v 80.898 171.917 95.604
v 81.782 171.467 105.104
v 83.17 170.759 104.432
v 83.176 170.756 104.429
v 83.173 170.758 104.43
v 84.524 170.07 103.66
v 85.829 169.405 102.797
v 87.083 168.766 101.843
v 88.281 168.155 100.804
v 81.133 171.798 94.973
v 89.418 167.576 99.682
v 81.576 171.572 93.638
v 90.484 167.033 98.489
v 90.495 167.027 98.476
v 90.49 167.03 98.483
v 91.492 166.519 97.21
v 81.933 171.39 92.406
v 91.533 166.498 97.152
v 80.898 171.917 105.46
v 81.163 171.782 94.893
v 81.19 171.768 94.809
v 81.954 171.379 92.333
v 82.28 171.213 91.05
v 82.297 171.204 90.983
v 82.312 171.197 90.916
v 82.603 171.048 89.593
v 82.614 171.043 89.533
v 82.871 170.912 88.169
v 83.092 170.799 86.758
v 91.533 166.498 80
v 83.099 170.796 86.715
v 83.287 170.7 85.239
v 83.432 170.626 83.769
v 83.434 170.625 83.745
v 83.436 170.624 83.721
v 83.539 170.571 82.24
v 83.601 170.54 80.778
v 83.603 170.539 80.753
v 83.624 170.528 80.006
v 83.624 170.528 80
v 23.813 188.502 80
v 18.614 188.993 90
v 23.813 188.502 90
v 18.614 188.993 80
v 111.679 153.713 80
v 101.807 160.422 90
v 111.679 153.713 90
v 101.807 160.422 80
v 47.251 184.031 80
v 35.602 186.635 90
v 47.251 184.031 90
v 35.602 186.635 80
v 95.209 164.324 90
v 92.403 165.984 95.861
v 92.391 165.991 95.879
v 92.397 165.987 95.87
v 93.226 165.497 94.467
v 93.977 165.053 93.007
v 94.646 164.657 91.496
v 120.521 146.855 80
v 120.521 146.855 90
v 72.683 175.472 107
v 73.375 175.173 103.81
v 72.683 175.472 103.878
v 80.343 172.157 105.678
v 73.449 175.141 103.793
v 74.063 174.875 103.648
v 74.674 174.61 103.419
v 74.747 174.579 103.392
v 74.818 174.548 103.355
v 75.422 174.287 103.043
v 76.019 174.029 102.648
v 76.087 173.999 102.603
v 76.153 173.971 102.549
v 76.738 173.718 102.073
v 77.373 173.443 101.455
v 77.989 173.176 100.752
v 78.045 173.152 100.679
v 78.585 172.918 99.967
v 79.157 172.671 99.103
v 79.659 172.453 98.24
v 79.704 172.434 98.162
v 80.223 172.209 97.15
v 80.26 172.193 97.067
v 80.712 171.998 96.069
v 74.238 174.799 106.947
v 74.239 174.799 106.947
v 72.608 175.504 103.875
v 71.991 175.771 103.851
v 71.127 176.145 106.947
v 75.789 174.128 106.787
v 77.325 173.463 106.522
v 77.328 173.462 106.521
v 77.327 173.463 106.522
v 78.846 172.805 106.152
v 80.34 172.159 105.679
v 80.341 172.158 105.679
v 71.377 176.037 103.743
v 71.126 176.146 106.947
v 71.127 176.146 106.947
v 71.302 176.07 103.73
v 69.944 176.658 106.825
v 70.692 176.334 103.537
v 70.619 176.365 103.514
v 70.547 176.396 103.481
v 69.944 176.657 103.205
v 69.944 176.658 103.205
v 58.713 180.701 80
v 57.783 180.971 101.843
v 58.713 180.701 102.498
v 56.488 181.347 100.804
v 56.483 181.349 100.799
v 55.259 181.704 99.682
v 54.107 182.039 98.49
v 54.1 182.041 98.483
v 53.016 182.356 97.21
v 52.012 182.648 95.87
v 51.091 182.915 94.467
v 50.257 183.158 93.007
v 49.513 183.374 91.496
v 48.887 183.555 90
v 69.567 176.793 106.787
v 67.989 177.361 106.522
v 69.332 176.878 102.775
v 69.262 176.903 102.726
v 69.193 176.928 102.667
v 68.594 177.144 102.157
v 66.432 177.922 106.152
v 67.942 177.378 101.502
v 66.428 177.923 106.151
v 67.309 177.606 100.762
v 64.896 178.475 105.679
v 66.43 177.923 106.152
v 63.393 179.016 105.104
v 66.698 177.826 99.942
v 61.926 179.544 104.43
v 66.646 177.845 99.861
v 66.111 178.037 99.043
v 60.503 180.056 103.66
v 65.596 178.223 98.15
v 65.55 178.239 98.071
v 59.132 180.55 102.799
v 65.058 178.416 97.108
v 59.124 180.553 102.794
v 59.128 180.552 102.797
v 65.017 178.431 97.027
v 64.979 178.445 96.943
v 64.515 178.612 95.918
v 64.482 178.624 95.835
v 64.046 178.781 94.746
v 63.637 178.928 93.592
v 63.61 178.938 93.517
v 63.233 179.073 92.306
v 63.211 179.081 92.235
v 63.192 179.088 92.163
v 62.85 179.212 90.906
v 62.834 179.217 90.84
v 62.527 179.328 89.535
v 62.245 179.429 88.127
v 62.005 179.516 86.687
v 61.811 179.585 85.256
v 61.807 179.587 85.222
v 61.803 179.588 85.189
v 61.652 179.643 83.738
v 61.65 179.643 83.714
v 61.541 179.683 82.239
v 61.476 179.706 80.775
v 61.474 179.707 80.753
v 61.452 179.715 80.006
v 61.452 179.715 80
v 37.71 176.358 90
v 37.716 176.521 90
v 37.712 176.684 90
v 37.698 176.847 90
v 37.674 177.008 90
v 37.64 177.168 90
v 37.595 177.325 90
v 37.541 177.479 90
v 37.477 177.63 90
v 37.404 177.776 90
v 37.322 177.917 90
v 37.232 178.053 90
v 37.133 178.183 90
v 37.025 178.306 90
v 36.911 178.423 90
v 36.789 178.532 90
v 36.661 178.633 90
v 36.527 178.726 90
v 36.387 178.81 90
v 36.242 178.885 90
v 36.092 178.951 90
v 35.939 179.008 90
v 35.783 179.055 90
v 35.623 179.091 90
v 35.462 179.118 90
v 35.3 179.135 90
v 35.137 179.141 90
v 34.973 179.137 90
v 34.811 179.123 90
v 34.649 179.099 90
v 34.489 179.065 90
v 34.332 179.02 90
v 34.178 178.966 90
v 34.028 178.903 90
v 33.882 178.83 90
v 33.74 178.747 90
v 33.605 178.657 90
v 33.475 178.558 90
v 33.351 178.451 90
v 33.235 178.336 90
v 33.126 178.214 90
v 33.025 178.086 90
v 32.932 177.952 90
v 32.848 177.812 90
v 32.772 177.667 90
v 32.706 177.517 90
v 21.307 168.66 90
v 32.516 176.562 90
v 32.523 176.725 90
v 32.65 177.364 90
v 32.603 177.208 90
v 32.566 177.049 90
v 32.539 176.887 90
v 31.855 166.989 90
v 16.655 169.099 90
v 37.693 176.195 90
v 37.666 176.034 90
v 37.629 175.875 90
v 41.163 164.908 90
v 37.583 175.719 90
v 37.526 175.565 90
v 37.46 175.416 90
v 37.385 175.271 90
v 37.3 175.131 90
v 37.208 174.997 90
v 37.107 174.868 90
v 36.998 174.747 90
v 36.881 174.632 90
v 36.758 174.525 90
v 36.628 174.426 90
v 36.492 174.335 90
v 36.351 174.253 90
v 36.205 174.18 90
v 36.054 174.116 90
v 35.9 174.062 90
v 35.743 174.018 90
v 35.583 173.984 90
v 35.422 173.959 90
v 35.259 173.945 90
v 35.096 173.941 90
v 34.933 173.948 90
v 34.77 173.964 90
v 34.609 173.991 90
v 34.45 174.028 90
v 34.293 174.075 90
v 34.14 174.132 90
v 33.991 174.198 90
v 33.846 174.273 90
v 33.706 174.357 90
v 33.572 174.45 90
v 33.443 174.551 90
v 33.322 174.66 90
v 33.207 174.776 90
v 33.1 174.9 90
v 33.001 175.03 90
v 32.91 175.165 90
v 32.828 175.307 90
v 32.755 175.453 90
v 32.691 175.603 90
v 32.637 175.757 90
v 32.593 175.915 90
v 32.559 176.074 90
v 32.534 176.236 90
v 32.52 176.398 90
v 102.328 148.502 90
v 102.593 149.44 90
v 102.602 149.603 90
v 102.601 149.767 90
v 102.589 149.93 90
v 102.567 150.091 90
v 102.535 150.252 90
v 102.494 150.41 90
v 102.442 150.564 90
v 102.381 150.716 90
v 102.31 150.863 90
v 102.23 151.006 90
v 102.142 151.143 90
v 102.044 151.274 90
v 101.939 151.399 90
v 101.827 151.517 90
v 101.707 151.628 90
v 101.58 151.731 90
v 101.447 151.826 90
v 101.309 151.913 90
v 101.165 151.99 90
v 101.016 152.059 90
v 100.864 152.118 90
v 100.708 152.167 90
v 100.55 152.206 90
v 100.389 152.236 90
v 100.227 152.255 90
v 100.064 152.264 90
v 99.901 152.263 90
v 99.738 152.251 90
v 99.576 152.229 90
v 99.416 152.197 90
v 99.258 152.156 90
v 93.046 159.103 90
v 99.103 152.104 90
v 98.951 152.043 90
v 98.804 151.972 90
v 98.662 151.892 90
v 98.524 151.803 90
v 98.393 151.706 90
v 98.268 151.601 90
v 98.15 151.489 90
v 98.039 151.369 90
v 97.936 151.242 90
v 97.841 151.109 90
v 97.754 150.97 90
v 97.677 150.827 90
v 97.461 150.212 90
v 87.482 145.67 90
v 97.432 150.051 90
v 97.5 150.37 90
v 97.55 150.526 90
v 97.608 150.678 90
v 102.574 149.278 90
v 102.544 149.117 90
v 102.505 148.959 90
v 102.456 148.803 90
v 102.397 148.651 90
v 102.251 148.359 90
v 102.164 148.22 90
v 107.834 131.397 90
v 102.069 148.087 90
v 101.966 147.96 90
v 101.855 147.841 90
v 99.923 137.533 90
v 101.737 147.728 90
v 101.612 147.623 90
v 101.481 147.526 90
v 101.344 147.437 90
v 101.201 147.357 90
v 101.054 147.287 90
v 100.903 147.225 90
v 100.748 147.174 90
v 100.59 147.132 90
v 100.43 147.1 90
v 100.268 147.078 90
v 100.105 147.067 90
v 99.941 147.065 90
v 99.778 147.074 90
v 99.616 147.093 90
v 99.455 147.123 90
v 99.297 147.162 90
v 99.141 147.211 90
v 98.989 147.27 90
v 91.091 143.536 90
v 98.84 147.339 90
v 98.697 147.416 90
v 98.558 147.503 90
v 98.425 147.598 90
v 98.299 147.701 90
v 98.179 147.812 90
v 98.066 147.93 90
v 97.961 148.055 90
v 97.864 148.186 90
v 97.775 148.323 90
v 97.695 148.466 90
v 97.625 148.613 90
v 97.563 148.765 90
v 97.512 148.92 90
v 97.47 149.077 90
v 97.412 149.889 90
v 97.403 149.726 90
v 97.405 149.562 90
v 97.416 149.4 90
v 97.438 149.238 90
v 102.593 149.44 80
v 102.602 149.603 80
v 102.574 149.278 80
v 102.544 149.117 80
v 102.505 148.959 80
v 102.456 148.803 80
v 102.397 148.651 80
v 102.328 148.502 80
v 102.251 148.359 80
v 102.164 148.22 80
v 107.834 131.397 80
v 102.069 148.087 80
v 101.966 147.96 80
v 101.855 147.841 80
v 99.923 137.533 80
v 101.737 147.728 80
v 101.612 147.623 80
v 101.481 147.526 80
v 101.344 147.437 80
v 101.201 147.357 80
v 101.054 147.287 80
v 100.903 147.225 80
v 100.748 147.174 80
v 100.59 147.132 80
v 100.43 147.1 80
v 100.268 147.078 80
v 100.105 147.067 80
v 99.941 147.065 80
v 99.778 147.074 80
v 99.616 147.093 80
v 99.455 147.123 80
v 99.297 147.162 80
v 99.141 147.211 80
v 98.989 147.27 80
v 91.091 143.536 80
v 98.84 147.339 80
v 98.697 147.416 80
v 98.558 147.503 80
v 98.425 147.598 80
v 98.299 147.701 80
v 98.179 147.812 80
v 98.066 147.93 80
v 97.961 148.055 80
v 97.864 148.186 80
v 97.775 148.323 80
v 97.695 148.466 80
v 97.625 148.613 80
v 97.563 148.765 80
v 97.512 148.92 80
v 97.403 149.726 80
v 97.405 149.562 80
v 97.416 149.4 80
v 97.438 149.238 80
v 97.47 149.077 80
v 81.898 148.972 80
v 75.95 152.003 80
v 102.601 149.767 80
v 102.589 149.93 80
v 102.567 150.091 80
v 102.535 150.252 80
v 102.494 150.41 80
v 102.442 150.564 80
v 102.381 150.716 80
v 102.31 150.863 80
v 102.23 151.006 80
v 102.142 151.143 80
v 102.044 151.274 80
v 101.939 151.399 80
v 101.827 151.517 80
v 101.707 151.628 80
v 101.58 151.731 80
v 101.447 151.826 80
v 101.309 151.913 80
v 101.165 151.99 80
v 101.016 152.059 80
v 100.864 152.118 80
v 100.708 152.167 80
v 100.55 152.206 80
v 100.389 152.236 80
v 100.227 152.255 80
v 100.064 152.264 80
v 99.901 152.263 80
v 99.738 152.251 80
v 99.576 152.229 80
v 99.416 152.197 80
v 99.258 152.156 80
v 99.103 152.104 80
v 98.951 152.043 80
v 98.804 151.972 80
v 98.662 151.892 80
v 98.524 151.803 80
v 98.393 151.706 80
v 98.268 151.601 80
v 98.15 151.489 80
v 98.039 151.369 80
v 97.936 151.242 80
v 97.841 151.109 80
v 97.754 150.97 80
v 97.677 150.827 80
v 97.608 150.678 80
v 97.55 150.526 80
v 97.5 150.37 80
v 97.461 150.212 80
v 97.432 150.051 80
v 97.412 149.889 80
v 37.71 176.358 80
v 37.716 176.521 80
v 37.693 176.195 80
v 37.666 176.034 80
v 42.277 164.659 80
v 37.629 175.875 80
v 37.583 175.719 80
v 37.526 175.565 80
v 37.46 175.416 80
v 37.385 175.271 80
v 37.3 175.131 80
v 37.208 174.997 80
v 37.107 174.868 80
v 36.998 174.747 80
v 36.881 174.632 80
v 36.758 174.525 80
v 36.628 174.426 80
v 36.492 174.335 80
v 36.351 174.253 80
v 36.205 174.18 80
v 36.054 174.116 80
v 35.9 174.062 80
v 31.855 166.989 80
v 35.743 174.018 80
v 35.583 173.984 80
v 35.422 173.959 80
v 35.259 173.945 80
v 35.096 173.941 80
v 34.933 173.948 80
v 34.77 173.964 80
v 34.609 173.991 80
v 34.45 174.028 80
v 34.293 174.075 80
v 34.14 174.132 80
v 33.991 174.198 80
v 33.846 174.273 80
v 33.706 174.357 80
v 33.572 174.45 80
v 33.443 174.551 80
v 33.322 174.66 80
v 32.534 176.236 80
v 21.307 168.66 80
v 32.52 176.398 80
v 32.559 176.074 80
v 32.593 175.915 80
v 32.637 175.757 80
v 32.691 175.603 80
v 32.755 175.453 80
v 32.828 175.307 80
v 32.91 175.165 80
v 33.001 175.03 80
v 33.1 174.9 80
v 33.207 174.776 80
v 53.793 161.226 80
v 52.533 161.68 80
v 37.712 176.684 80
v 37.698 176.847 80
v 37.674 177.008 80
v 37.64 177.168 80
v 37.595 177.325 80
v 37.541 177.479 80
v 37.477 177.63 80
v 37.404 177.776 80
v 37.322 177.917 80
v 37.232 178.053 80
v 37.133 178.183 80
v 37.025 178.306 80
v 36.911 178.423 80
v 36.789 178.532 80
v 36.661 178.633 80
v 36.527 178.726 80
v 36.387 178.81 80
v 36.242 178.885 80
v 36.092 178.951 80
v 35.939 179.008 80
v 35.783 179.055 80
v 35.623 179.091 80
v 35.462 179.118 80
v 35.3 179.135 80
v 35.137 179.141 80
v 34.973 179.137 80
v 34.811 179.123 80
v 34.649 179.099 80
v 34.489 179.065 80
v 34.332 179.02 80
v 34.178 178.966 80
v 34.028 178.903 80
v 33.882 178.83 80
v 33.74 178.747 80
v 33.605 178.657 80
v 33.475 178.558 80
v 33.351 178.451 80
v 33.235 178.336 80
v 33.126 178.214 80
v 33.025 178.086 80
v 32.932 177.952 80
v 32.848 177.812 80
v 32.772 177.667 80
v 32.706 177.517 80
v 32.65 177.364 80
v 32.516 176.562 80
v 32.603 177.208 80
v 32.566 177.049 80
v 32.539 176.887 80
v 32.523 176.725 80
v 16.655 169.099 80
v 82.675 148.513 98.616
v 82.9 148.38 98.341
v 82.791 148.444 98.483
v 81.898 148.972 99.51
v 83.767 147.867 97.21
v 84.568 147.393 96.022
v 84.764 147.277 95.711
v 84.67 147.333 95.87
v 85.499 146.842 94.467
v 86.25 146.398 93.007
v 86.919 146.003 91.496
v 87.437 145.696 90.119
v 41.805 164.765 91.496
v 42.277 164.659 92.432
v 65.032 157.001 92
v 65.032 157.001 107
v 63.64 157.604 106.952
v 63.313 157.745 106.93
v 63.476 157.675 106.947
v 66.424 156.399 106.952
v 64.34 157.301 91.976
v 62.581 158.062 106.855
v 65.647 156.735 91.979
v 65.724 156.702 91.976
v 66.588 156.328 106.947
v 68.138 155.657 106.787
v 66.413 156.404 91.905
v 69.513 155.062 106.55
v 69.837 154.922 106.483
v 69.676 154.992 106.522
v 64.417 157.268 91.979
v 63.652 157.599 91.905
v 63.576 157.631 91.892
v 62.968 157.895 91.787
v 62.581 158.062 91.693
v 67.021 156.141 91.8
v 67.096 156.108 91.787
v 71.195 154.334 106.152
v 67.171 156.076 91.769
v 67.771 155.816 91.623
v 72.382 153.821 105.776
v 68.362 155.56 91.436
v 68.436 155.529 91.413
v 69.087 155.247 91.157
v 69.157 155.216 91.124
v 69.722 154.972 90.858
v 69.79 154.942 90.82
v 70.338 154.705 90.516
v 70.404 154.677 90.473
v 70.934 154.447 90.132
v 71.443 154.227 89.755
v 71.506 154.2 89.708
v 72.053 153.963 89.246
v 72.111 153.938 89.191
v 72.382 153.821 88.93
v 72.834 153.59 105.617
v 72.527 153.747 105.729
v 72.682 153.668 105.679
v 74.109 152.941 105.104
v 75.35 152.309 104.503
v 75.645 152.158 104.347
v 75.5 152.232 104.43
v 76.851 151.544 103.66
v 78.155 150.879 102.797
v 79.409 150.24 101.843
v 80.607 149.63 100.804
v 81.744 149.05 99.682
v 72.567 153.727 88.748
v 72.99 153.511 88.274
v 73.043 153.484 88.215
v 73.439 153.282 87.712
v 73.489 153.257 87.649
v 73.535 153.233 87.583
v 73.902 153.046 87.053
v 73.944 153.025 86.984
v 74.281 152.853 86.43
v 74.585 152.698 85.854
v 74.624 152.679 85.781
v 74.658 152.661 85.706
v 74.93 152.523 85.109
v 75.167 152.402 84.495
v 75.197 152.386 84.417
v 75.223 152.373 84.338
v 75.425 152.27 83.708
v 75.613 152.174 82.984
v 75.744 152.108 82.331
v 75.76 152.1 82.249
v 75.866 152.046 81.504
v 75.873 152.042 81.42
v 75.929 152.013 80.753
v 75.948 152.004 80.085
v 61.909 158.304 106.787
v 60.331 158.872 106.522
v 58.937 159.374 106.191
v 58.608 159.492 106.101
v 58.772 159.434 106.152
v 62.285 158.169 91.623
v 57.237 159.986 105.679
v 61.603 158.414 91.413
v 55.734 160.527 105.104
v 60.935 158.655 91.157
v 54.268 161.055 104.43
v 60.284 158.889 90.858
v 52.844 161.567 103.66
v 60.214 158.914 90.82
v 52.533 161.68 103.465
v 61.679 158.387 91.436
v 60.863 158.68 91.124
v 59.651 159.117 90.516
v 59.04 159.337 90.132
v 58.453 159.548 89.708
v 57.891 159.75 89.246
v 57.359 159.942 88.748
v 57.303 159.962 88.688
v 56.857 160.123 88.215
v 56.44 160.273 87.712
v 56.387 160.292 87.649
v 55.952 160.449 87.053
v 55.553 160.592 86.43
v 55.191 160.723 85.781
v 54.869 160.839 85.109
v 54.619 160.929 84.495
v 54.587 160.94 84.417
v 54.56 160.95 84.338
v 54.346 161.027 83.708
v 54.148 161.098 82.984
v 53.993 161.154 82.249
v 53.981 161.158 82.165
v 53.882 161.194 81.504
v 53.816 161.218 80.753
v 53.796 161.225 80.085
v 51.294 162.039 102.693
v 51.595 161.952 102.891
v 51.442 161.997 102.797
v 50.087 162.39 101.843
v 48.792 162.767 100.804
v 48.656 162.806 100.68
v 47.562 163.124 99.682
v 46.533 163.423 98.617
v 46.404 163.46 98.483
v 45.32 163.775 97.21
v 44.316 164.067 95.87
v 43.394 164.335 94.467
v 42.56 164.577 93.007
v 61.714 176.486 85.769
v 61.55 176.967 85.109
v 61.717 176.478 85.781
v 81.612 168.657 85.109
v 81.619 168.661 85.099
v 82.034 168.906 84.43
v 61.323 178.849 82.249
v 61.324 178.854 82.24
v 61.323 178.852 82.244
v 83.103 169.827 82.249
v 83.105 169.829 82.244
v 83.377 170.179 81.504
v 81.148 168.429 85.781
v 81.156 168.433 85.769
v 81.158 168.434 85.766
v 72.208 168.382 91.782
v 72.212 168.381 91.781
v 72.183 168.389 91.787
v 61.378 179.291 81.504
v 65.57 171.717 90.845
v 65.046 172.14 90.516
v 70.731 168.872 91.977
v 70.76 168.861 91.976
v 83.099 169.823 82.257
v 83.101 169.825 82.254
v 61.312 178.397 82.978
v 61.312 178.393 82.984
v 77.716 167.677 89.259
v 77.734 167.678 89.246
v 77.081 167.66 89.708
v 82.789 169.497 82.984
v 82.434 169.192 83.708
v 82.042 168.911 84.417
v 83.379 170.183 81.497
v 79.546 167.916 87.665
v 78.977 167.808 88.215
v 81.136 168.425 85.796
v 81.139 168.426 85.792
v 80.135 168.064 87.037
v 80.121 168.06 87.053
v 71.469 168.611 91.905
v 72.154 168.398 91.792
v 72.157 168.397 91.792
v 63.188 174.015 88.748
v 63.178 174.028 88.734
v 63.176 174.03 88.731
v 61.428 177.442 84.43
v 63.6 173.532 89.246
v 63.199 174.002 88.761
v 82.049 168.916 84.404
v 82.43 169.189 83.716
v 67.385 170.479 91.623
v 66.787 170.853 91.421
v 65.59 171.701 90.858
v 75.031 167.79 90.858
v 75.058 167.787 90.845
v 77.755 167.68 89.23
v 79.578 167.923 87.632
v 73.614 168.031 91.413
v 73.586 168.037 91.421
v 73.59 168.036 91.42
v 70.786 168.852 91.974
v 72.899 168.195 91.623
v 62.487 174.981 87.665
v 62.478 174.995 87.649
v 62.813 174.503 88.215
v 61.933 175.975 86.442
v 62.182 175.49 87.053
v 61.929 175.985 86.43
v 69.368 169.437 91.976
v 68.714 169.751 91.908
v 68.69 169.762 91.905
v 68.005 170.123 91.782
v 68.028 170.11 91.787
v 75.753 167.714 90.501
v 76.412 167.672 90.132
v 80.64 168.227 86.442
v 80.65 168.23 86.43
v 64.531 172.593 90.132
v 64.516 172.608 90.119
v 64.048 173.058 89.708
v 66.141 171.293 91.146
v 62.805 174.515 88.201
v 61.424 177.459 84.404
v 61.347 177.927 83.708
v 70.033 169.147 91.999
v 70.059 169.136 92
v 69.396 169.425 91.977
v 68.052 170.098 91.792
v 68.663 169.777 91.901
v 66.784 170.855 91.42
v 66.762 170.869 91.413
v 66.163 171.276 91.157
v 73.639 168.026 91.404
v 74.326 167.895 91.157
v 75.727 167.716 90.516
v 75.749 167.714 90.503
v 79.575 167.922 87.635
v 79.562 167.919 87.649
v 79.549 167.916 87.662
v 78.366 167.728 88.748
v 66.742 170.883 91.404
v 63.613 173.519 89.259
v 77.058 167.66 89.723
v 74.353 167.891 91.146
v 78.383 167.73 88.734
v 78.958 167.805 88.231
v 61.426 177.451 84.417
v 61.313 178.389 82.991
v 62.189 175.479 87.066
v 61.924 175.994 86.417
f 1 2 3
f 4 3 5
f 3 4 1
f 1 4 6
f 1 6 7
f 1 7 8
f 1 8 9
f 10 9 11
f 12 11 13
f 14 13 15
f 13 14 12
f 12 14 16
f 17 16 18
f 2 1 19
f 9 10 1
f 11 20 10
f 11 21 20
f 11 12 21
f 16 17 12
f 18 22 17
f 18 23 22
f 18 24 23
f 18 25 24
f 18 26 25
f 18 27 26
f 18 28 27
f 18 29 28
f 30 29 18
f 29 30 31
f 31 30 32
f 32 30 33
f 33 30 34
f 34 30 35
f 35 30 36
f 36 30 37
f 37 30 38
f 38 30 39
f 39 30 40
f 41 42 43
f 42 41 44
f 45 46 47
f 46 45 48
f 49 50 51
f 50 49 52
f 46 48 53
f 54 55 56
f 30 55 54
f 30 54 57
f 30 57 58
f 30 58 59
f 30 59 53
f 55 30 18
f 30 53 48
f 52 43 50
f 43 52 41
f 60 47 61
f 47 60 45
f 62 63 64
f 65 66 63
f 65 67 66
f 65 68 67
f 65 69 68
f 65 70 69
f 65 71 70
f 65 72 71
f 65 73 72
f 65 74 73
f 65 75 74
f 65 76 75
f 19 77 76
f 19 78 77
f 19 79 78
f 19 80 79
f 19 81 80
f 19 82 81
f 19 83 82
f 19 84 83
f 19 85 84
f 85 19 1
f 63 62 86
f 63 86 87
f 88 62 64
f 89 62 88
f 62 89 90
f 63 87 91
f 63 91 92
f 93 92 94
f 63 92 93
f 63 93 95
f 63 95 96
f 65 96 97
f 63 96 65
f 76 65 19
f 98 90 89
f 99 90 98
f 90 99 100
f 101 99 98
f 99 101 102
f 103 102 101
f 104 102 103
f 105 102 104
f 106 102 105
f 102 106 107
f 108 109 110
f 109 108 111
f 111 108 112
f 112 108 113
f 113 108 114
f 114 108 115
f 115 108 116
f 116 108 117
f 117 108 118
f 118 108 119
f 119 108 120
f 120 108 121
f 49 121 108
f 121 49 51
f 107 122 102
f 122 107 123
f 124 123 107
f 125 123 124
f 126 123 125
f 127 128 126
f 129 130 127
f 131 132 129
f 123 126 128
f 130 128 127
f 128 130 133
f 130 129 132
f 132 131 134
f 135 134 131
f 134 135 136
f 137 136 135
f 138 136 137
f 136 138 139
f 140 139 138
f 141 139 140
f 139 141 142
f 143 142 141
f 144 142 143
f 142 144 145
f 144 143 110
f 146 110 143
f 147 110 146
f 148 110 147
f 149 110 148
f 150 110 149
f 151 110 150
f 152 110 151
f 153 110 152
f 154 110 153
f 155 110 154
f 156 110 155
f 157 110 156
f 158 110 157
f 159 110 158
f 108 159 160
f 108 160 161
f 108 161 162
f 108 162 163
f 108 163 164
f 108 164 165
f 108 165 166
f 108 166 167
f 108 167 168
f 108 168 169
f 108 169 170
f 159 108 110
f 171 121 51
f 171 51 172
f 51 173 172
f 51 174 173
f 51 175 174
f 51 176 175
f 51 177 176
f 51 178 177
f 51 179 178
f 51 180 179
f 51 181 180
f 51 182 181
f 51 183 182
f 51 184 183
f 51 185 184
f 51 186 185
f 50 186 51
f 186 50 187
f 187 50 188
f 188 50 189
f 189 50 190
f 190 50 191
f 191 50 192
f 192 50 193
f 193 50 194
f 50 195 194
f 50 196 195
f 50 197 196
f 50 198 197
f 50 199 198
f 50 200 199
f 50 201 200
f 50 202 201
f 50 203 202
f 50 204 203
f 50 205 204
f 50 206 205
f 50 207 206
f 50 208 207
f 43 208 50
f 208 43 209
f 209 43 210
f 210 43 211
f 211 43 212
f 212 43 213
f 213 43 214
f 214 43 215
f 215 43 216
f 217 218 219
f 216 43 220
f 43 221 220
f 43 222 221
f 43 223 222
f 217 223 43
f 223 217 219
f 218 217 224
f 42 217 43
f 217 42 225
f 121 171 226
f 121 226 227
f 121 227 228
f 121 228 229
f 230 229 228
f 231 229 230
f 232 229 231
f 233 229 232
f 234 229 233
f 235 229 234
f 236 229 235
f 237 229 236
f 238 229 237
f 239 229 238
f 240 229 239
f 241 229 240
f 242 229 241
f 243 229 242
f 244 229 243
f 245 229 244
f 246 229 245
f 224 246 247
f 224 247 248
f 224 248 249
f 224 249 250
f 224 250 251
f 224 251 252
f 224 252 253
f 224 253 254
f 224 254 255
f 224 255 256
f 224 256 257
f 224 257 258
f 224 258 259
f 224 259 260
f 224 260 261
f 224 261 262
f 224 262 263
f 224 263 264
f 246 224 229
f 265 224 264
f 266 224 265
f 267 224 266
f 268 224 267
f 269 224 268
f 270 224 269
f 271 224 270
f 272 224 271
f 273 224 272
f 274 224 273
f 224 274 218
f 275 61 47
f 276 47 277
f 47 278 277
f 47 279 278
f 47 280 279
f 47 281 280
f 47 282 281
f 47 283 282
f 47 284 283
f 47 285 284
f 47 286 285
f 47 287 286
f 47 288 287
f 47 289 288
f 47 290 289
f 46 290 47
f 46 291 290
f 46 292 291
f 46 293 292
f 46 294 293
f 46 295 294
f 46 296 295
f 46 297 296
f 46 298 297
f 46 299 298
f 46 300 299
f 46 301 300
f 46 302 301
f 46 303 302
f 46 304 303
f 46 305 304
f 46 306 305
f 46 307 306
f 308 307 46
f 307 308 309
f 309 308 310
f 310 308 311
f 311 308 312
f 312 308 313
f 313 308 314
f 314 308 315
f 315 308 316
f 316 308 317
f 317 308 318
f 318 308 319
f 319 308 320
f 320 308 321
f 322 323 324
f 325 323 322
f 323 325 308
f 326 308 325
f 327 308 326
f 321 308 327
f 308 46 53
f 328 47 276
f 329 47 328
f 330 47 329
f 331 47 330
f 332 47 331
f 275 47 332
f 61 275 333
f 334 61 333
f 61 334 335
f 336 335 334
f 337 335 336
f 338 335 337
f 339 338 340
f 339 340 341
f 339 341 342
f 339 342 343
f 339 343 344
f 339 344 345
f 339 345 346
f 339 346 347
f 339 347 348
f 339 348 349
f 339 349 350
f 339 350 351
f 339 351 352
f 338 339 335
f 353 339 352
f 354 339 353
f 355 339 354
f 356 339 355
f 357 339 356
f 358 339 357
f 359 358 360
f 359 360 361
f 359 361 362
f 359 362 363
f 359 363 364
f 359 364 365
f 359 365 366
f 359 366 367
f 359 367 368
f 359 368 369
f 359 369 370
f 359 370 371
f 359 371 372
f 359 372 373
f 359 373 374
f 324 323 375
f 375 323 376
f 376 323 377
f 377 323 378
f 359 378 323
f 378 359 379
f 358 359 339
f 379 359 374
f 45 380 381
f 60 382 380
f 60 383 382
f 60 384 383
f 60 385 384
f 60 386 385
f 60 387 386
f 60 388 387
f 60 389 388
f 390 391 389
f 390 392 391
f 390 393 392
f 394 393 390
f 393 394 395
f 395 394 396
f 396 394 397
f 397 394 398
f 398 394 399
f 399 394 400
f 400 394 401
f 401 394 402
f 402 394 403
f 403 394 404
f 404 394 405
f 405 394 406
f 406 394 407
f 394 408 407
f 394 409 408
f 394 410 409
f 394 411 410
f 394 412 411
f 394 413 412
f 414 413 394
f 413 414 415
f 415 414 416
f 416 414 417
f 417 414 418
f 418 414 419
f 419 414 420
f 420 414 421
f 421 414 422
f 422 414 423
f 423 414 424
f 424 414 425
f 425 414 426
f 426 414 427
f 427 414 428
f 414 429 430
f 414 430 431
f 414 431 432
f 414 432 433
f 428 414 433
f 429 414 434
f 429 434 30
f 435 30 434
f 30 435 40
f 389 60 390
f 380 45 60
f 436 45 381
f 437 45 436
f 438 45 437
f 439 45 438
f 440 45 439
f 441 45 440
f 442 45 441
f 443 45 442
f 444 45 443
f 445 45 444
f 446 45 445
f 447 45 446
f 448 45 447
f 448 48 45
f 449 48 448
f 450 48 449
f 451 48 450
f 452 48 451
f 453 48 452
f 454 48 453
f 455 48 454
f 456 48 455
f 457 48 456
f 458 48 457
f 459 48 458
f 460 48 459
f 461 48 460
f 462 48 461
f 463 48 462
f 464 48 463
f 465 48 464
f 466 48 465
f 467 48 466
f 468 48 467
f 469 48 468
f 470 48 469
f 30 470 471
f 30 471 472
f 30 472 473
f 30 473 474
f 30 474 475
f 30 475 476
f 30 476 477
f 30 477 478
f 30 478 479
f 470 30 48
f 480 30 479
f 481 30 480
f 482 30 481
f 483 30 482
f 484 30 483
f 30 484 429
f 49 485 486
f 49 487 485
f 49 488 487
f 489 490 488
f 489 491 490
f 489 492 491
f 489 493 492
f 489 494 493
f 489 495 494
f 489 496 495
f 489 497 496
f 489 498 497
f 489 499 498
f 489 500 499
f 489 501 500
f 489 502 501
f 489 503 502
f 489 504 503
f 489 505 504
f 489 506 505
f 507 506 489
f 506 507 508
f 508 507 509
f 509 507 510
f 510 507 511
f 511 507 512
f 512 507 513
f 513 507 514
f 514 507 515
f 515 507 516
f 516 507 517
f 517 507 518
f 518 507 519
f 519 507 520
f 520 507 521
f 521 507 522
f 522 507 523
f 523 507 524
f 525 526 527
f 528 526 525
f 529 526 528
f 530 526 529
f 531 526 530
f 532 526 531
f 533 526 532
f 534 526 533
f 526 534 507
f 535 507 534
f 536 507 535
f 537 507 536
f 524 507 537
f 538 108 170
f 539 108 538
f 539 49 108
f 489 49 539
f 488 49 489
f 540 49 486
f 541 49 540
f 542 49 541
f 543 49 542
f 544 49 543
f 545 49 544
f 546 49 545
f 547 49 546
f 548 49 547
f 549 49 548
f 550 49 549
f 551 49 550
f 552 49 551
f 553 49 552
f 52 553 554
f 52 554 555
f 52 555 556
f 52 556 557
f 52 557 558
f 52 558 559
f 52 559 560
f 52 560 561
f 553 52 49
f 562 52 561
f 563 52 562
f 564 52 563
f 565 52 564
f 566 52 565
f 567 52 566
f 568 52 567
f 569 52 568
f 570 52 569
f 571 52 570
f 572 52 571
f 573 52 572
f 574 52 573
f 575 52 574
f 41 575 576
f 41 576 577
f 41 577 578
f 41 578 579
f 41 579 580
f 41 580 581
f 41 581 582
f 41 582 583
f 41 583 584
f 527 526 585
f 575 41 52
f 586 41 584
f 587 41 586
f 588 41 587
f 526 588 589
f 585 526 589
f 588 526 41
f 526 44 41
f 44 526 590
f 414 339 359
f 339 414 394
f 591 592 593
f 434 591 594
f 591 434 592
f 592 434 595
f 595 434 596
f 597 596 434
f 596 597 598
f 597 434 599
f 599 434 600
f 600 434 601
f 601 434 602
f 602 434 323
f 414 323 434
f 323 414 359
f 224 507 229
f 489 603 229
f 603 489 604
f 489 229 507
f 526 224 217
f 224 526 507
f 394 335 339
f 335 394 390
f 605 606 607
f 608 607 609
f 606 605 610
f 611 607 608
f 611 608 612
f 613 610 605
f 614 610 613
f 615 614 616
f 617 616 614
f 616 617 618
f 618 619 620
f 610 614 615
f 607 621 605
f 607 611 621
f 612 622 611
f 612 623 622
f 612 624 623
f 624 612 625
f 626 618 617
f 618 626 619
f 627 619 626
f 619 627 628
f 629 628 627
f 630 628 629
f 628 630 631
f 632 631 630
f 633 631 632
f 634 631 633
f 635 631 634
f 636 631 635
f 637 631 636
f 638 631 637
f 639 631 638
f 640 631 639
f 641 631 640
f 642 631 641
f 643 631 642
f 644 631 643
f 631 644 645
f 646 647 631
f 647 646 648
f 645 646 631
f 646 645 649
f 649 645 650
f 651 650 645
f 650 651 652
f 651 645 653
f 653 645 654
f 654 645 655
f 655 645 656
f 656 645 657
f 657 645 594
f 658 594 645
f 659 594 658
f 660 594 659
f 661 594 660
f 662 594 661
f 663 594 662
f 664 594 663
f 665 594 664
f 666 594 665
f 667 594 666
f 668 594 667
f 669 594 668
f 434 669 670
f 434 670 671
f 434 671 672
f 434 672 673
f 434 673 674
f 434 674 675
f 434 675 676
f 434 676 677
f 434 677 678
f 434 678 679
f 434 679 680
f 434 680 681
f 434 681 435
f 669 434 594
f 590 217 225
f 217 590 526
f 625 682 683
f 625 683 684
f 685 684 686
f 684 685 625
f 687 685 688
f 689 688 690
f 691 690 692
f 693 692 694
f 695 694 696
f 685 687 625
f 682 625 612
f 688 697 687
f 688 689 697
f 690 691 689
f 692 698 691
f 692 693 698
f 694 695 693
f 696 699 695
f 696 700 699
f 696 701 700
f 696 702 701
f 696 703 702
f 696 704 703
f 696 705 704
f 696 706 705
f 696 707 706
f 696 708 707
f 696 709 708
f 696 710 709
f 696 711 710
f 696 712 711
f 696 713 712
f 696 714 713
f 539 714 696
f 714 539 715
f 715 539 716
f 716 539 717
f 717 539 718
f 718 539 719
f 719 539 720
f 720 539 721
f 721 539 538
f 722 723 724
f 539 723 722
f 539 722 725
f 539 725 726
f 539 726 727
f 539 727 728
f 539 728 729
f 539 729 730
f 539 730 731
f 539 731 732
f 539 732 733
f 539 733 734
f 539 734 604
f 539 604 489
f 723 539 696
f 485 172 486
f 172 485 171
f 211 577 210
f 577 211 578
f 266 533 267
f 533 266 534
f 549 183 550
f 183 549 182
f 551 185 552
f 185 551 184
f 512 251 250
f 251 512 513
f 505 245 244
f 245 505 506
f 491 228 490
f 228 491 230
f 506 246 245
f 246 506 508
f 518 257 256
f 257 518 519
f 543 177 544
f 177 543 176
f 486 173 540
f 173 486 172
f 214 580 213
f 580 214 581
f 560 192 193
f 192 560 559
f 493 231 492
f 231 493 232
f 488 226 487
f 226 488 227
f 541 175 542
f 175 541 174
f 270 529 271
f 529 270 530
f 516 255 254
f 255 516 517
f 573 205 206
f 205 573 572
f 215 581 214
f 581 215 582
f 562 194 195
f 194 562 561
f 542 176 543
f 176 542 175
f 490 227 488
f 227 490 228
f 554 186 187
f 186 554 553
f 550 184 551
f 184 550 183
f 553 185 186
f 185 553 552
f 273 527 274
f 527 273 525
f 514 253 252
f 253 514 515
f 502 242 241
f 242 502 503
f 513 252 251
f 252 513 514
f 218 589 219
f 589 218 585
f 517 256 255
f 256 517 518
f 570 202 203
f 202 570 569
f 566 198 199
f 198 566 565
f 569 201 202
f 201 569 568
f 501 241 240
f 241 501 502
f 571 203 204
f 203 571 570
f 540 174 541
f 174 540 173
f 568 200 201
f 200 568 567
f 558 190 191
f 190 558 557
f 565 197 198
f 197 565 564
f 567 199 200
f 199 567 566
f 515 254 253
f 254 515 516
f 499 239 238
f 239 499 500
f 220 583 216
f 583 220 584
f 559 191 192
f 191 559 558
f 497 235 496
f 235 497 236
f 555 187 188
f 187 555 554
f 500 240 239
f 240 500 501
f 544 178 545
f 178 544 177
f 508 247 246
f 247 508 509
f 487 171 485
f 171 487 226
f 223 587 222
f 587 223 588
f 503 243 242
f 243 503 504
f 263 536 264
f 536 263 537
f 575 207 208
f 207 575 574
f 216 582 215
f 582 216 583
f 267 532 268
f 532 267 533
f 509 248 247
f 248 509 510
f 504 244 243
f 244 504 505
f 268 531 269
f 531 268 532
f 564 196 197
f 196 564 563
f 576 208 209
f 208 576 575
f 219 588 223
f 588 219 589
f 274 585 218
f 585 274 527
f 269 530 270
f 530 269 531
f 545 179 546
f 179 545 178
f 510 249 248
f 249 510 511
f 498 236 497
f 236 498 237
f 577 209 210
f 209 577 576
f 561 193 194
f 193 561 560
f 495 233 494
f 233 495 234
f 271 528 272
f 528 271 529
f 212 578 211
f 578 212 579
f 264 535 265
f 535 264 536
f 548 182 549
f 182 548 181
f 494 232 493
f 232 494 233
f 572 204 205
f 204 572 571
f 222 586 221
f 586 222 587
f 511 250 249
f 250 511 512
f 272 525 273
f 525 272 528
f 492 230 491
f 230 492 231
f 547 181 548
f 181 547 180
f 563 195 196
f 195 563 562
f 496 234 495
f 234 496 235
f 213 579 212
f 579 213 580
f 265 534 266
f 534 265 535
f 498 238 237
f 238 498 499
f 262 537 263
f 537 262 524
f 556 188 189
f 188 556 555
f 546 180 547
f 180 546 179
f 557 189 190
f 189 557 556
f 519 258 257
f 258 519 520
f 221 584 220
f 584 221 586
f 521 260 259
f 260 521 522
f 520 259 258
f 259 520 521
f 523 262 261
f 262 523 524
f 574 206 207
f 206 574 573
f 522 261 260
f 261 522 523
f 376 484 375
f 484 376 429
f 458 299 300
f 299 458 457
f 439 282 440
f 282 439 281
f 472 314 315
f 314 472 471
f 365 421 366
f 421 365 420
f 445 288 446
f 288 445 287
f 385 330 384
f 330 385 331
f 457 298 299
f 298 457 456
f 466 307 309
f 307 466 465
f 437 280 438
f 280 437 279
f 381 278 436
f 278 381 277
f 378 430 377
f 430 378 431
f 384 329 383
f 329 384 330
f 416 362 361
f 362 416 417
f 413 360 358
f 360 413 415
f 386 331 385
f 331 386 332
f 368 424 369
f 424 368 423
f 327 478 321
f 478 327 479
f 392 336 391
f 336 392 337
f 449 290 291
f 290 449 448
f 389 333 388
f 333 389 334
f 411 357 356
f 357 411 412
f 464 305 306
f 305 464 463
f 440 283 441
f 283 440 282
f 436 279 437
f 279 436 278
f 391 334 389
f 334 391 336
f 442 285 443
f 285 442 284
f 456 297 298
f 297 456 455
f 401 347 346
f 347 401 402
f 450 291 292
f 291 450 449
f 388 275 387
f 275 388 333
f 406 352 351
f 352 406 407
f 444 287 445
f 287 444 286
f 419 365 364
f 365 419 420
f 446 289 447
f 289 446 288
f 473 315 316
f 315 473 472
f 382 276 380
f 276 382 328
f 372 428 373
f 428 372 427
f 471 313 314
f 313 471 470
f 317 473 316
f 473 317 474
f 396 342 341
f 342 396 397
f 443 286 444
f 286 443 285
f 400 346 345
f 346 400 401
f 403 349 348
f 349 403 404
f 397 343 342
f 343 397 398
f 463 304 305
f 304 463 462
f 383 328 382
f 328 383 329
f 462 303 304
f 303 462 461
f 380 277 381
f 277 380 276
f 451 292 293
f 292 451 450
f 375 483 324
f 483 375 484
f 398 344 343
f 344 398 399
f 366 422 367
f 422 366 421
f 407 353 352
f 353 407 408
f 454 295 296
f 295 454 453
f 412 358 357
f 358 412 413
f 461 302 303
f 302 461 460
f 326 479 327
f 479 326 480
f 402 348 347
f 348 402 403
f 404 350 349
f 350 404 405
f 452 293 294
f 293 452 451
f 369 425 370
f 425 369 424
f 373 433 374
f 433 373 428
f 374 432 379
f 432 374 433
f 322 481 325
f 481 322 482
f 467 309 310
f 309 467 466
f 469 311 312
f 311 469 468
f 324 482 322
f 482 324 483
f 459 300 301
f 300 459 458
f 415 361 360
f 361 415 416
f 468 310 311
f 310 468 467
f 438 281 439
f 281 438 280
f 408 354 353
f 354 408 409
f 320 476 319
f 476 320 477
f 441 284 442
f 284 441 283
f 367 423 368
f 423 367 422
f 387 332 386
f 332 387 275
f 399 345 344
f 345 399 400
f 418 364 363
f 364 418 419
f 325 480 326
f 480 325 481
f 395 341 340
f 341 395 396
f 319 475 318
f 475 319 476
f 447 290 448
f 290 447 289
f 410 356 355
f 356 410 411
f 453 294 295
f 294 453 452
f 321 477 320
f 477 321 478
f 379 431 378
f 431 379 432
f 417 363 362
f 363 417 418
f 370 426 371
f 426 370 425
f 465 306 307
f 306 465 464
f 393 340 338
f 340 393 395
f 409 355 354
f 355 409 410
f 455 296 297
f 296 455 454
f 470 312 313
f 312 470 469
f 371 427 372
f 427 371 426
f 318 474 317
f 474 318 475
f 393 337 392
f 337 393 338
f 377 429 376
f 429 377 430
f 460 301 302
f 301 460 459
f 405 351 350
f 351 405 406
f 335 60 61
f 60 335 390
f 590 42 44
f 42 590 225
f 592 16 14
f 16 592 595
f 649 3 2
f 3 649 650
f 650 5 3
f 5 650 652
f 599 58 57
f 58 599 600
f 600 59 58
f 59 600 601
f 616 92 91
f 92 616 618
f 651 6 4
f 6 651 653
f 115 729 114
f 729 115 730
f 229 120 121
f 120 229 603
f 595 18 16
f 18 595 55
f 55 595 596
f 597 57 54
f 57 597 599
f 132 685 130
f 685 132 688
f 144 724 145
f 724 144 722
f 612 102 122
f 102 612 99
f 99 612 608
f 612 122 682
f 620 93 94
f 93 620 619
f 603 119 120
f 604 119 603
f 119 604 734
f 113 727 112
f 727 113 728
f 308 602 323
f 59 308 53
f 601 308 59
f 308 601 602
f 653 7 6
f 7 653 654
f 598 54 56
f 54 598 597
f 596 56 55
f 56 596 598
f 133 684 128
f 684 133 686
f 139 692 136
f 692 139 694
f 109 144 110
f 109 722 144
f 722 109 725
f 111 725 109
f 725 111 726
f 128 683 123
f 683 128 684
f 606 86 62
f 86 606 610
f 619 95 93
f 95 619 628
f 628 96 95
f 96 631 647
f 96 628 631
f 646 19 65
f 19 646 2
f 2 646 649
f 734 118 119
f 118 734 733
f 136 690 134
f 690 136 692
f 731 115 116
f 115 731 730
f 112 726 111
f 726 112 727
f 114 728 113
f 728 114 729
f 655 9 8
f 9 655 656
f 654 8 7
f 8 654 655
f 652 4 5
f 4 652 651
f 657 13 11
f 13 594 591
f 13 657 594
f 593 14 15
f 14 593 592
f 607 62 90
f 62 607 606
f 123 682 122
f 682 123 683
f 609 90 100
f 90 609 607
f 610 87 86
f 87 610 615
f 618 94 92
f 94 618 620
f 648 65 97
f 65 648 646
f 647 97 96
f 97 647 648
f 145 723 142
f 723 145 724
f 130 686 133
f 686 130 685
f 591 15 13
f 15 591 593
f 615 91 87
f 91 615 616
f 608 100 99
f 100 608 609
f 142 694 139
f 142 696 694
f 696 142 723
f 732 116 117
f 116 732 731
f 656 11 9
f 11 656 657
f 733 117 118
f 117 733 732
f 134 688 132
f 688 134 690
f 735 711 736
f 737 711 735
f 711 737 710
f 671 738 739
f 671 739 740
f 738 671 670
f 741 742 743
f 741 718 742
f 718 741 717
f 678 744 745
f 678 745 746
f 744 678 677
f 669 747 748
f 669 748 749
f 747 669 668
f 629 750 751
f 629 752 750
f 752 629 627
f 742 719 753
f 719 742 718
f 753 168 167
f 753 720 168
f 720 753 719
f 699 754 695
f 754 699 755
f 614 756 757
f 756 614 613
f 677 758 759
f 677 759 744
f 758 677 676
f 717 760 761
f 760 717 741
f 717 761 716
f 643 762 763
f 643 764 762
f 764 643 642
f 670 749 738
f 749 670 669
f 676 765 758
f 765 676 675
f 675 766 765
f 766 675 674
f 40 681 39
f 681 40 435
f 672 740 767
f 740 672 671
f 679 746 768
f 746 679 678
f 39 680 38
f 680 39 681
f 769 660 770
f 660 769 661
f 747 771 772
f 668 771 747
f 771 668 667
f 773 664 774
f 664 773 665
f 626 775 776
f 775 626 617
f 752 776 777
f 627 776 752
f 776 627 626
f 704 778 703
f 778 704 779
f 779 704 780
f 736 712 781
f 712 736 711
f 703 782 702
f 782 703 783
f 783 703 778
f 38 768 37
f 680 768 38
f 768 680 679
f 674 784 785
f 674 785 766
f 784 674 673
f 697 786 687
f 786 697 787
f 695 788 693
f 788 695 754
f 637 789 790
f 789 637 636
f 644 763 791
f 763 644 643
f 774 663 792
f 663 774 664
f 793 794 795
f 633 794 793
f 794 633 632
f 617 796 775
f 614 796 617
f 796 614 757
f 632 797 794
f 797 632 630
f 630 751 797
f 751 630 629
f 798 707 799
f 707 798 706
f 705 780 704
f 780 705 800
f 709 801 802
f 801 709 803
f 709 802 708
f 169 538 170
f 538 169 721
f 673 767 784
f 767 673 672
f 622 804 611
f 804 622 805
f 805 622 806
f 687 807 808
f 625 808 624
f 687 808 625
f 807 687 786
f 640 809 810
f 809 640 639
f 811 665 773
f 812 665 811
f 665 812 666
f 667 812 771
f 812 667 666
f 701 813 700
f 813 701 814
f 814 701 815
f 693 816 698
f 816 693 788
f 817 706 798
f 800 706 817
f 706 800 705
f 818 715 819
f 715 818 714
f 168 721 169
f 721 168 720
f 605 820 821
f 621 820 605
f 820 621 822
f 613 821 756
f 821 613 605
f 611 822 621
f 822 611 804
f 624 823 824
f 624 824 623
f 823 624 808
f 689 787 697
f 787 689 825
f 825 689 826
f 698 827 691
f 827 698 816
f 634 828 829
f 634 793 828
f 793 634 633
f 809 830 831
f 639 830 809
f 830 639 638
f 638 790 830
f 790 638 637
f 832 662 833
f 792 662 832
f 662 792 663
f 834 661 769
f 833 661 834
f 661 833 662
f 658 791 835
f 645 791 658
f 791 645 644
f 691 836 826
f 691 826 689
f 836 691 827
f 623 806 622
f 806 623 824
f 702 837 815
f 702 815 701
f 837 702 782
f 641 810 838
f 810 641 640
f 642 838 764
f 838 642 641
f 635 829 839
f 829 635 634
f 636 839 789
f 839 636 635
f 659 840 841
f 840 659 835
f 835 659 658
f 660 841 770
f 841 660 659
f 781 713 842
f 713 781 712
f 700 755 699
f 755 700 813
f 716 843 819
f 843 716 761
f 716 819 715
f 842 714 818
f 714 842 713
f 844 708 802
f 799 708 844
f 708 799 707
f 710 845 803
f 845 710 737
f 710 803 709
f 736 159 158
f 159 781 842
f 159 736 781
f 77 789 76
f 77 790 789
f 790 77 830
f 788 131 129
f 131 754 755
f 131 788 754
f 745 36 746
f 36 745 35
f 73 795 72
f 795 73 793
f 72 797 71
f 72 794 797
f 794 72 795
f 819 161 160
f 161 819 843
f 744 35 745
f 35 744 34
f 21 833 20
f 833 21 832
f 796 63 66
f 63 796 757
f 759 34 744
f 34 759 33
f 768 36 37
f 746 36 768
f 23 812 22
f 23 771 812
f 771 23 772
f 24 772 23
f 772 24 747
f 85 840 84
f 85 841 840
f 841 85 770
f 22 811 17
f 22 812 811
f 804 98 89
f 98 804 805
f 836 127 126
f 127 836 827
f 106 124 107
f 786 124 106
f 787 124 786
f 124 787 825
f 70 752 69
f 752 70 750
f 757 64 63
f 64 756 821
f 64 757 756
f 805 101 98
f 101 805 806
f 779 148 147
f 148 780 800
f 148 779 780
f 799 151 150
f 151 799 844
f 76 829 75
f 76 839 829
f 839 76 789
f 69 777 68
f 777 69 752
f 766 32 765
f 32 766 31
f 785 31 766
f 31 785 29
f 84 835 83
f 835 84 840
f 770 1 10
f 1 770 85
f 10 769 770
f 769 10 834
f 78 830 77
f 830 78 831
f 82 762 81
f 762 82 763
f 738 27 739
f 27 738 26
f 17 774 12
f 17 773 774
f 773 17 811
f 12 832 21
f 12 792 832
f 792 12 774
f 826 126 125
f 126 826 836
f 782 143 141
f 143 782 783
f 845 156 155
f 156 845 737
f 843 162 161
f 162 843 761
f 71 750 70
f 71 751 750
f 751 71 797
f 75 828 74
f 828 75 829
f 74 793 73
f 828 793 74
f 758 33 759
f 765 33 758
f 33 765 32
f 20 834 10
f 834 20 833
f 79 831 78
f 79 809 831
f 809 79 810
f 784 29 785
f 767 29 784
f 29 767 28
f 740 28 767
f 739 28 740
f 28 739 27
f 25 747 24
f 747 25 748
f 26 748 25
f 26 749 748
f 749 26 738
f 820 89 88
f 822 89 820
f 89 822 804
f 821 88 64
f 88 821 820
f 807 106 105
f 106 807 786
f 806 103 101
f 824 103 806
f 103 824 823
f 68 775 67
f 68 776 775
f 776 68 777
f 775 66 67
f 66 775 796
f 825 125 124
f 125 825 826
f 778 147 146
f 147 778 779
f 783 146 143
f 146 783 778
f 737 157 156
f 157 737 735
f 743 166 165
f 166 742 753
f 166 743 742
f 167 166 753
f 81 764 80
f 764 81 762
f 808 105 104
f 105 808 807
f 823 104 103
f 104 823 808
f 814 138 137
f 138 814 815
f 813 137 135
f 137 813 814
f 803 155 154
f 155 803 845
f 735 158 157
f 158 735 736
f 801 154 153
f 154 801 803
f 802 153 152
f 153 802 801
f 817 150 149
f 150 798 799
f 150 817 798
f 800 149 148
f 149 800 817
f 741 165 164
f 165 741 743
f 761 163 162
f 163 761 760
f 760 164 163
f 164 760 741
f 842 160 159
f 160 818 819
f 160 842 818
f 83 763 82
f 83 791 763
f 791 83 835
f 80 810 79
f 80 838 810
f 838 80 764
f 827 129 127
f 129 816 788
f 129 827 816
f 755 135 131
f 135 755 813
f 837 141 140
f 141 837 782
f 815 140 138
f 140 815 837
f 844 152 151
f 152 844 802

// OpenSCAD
// file: molde_defs.scad
r = 170;
h = 80;
wall = 20;
fn = 100;
N = 8;
c_thick = 20;
bc_thick = c_thick / 2;
c_length = 20;
c_width = h;
hole_r = 4.5 / 2;
bhole_r = 4.5;
par_1 = 5; // bottom_connect parameter for hole distance
explode_r = 10;

leg_d = 23 + 1;

echo( 3.14 * ( r / 1000 ) * ( r / 1000 ) * ( h / 1000 ) * 1000 );
// main file
include <molde_defs.scad>

module side_connect(){
    difference(){
        translate( [ -c_thick / 2, r + wall / 2, 0 ] )
            cube( [ c_thick, c_length + wall / 2, h ] );
    
        translate( [ 0, 0, h / 4 ] )
            rotate( 90, [ 0, 1, 0 ] )
                translate( [ 0, r + wall + c_length / 2, -c_thick ] )
                    cylinder( h = 2 * c_thick, r = hole_r, $fn = fn );
        translate( [ 0, 0, h - h / 4 ] )
            rotate( 90, [ 0, 1, 0 ] )
                translate( [ 0, r + wall + c_length / 2, -c_thick ] )
                    cylinder( h = 2 * c_thick, r = hole_r, $fn = fn );
    }
}

module bottom_connect(){
    difference(){
        translate( [ -c_width / 2, r, 0 ] )
            cube( [ c_width, c_length + wall, bc_thick ] );
        translate( [ c_width / 2 - c_width / par_1, r + wall + c_length / 2, -1 ] )
            cylinder( h = c_thick + 2, r = bhole_r, $fn = fn );
        translate( [ -c_width / 2 + c_width / par_1, r + wall + c_length / 2, -1 ] )
            cylinder( h = c_thick + 2, r = bhole_r, $fn = fn );
    }
}

module perimeter(){
    difference(){
        union(){
            cylinder( h = h, r = r + wall, $fn = fn );
            for ( i = [ 0 : N - 1 ] ){
                rotate( i * 360 / N, [ 0, 0, 1 ] )
                    side_connect();
                rotate( ( i + 0.5 ) * 360 / N, [ 0, 0, 1 ] )
                    bottom_connect();
            }
        }
            
        translate( [ 0, 0, -1 ] )
            cylinder( h = h + 2, r = r, $fn = fn );
    }
}

function pie_outline( r, theta ) =
    [
        [ 0, 0 ],
        for ( i = [ 0 : fn - 1 ] )
            [ r * sin( i * theta / ( fn - 1 ) ), r * cos( i * theta / ( fn - 1 ) ) ],
    ];

module slice(){
    intersection(){
        translate( [ 0, 0, -1 ] )
            linear_extrude( height = h + 2 )
                polygon( points = pie_outline( 2 * r , 360 / N ) );
        perimeter();
    }
}

module slice_leg(){
    difference(){
        slice();
        rotate( -180 / N, [ 0, 0, 1 ] )
        translate( [ 0, r + 1.5 * wall, h ] )
            rotate( 90, [ 1, 0, 0 ] )
                cylinder( h = 2 * wall, d = leg_d, $fn = fn );
        rotate( ( -180 / N ) * 0.5 ,  [ 0, 0, 1 ] )
            translate( [ 0, r + 0.5 * wall, -10 ] )
                cylinder( h = h + 20, d = 4.8, $fn = fn );
        rotate( ( -180 / N ) * 1.5 ,  [ 0, 0, 1 ] )
            translate( [ 0, r + 0.5 * wall, -10 ] )
                cylinder( h = h + 20, d = 4.8, $fn = fn );
    }
}

//for ( i = [ 0 : N - 1 ] )
//    rotate( i * 360 / N, [ 0, 0, 1 ] )
//        translate( explode_r * [ sin( 180 / N ), cos( 180 / N ), 0 ] )
//            if ( i % 2 == 0 )
//                slice();
//            else
//                slice_leg();
//slice_leg();

//module slice_small(){
//    intersection(){
//        translate( [ 0, 0, -1 ] )
//            linear_extrude( height = h + 2 )
//                polygon( points = pie_outline( 2 * r , 360 / N ) );
//        perimeter();
//    }
//}

translate( [ 0, 0, h ] ){
    difference(){
        union(){
            intersection(){
                difference(){
                    cylinder( h = 10, r = r + wall, $fn = fn );
                    translate( [ 0, 0, -1 ] )
                        cylinder( h = h + 2, r = r, $fn = fn );
                    rotate( ( -180 / N ) * 0.5,  [ 0, 0, 1 ] )
                        translate( [ 0, r + 0.5 * wall, -10 ] )
                            cylinder( h = h + 20, d = 5.2, $fn = fn );
                    rotate( ( -180 / N ) * 1.5 ,  [ 0, 0, 1 ] )
                        translate( [ 0, r + 0.5 * wall, -10 ] )
                            cylinder( h = h + 20, d = 5.2, $fn = fn );
                }
                rotate( -360 / N * 0.25 / 2, [ 0, 0, 1 ] )
                    translate( [ 0, 0, -1 ] )
                        linear_extrude( height = h + 2 )
                            polygon( points = pie_outline( 2 * r , 360 / N * 0.75 ) );
            }
            intersection(){
                rotate( -180 / N, [ 0, 0, 1 ] )
                    rotate( -90, [ 1, 0, 0 ] )
                        cylinder( d = leg_d + 2 * 15, h = r + wall, $fn = fn );
                        difference(){
                            cylinder( h = leg_d + 2 * 15, r = r + wall, $fn = fn );
                            translate( [ 0, 0, -1 ] )
                                cylinder( h = leg_d + 2 * 15 + 2, r = r, $fn = fn );
                        }
            }
        }
        rotate( -180 / N, [ 0, 0, 1 ] )
            rotate( -90, [ 1, 0, 0 ] )
                cylinder( d = leg_d, h = r + wall + 1, $fn = fn );
        rotate( -180 / N, [ 0, 0, 1 ] )
            translate( [ 0, r + wall, 0 ] )
                rotate( -30, [ 1, 0, 0 ] )
                    cylinder( d = leg_d, h = r + wall + 1, $fn = fn );
    }
}
